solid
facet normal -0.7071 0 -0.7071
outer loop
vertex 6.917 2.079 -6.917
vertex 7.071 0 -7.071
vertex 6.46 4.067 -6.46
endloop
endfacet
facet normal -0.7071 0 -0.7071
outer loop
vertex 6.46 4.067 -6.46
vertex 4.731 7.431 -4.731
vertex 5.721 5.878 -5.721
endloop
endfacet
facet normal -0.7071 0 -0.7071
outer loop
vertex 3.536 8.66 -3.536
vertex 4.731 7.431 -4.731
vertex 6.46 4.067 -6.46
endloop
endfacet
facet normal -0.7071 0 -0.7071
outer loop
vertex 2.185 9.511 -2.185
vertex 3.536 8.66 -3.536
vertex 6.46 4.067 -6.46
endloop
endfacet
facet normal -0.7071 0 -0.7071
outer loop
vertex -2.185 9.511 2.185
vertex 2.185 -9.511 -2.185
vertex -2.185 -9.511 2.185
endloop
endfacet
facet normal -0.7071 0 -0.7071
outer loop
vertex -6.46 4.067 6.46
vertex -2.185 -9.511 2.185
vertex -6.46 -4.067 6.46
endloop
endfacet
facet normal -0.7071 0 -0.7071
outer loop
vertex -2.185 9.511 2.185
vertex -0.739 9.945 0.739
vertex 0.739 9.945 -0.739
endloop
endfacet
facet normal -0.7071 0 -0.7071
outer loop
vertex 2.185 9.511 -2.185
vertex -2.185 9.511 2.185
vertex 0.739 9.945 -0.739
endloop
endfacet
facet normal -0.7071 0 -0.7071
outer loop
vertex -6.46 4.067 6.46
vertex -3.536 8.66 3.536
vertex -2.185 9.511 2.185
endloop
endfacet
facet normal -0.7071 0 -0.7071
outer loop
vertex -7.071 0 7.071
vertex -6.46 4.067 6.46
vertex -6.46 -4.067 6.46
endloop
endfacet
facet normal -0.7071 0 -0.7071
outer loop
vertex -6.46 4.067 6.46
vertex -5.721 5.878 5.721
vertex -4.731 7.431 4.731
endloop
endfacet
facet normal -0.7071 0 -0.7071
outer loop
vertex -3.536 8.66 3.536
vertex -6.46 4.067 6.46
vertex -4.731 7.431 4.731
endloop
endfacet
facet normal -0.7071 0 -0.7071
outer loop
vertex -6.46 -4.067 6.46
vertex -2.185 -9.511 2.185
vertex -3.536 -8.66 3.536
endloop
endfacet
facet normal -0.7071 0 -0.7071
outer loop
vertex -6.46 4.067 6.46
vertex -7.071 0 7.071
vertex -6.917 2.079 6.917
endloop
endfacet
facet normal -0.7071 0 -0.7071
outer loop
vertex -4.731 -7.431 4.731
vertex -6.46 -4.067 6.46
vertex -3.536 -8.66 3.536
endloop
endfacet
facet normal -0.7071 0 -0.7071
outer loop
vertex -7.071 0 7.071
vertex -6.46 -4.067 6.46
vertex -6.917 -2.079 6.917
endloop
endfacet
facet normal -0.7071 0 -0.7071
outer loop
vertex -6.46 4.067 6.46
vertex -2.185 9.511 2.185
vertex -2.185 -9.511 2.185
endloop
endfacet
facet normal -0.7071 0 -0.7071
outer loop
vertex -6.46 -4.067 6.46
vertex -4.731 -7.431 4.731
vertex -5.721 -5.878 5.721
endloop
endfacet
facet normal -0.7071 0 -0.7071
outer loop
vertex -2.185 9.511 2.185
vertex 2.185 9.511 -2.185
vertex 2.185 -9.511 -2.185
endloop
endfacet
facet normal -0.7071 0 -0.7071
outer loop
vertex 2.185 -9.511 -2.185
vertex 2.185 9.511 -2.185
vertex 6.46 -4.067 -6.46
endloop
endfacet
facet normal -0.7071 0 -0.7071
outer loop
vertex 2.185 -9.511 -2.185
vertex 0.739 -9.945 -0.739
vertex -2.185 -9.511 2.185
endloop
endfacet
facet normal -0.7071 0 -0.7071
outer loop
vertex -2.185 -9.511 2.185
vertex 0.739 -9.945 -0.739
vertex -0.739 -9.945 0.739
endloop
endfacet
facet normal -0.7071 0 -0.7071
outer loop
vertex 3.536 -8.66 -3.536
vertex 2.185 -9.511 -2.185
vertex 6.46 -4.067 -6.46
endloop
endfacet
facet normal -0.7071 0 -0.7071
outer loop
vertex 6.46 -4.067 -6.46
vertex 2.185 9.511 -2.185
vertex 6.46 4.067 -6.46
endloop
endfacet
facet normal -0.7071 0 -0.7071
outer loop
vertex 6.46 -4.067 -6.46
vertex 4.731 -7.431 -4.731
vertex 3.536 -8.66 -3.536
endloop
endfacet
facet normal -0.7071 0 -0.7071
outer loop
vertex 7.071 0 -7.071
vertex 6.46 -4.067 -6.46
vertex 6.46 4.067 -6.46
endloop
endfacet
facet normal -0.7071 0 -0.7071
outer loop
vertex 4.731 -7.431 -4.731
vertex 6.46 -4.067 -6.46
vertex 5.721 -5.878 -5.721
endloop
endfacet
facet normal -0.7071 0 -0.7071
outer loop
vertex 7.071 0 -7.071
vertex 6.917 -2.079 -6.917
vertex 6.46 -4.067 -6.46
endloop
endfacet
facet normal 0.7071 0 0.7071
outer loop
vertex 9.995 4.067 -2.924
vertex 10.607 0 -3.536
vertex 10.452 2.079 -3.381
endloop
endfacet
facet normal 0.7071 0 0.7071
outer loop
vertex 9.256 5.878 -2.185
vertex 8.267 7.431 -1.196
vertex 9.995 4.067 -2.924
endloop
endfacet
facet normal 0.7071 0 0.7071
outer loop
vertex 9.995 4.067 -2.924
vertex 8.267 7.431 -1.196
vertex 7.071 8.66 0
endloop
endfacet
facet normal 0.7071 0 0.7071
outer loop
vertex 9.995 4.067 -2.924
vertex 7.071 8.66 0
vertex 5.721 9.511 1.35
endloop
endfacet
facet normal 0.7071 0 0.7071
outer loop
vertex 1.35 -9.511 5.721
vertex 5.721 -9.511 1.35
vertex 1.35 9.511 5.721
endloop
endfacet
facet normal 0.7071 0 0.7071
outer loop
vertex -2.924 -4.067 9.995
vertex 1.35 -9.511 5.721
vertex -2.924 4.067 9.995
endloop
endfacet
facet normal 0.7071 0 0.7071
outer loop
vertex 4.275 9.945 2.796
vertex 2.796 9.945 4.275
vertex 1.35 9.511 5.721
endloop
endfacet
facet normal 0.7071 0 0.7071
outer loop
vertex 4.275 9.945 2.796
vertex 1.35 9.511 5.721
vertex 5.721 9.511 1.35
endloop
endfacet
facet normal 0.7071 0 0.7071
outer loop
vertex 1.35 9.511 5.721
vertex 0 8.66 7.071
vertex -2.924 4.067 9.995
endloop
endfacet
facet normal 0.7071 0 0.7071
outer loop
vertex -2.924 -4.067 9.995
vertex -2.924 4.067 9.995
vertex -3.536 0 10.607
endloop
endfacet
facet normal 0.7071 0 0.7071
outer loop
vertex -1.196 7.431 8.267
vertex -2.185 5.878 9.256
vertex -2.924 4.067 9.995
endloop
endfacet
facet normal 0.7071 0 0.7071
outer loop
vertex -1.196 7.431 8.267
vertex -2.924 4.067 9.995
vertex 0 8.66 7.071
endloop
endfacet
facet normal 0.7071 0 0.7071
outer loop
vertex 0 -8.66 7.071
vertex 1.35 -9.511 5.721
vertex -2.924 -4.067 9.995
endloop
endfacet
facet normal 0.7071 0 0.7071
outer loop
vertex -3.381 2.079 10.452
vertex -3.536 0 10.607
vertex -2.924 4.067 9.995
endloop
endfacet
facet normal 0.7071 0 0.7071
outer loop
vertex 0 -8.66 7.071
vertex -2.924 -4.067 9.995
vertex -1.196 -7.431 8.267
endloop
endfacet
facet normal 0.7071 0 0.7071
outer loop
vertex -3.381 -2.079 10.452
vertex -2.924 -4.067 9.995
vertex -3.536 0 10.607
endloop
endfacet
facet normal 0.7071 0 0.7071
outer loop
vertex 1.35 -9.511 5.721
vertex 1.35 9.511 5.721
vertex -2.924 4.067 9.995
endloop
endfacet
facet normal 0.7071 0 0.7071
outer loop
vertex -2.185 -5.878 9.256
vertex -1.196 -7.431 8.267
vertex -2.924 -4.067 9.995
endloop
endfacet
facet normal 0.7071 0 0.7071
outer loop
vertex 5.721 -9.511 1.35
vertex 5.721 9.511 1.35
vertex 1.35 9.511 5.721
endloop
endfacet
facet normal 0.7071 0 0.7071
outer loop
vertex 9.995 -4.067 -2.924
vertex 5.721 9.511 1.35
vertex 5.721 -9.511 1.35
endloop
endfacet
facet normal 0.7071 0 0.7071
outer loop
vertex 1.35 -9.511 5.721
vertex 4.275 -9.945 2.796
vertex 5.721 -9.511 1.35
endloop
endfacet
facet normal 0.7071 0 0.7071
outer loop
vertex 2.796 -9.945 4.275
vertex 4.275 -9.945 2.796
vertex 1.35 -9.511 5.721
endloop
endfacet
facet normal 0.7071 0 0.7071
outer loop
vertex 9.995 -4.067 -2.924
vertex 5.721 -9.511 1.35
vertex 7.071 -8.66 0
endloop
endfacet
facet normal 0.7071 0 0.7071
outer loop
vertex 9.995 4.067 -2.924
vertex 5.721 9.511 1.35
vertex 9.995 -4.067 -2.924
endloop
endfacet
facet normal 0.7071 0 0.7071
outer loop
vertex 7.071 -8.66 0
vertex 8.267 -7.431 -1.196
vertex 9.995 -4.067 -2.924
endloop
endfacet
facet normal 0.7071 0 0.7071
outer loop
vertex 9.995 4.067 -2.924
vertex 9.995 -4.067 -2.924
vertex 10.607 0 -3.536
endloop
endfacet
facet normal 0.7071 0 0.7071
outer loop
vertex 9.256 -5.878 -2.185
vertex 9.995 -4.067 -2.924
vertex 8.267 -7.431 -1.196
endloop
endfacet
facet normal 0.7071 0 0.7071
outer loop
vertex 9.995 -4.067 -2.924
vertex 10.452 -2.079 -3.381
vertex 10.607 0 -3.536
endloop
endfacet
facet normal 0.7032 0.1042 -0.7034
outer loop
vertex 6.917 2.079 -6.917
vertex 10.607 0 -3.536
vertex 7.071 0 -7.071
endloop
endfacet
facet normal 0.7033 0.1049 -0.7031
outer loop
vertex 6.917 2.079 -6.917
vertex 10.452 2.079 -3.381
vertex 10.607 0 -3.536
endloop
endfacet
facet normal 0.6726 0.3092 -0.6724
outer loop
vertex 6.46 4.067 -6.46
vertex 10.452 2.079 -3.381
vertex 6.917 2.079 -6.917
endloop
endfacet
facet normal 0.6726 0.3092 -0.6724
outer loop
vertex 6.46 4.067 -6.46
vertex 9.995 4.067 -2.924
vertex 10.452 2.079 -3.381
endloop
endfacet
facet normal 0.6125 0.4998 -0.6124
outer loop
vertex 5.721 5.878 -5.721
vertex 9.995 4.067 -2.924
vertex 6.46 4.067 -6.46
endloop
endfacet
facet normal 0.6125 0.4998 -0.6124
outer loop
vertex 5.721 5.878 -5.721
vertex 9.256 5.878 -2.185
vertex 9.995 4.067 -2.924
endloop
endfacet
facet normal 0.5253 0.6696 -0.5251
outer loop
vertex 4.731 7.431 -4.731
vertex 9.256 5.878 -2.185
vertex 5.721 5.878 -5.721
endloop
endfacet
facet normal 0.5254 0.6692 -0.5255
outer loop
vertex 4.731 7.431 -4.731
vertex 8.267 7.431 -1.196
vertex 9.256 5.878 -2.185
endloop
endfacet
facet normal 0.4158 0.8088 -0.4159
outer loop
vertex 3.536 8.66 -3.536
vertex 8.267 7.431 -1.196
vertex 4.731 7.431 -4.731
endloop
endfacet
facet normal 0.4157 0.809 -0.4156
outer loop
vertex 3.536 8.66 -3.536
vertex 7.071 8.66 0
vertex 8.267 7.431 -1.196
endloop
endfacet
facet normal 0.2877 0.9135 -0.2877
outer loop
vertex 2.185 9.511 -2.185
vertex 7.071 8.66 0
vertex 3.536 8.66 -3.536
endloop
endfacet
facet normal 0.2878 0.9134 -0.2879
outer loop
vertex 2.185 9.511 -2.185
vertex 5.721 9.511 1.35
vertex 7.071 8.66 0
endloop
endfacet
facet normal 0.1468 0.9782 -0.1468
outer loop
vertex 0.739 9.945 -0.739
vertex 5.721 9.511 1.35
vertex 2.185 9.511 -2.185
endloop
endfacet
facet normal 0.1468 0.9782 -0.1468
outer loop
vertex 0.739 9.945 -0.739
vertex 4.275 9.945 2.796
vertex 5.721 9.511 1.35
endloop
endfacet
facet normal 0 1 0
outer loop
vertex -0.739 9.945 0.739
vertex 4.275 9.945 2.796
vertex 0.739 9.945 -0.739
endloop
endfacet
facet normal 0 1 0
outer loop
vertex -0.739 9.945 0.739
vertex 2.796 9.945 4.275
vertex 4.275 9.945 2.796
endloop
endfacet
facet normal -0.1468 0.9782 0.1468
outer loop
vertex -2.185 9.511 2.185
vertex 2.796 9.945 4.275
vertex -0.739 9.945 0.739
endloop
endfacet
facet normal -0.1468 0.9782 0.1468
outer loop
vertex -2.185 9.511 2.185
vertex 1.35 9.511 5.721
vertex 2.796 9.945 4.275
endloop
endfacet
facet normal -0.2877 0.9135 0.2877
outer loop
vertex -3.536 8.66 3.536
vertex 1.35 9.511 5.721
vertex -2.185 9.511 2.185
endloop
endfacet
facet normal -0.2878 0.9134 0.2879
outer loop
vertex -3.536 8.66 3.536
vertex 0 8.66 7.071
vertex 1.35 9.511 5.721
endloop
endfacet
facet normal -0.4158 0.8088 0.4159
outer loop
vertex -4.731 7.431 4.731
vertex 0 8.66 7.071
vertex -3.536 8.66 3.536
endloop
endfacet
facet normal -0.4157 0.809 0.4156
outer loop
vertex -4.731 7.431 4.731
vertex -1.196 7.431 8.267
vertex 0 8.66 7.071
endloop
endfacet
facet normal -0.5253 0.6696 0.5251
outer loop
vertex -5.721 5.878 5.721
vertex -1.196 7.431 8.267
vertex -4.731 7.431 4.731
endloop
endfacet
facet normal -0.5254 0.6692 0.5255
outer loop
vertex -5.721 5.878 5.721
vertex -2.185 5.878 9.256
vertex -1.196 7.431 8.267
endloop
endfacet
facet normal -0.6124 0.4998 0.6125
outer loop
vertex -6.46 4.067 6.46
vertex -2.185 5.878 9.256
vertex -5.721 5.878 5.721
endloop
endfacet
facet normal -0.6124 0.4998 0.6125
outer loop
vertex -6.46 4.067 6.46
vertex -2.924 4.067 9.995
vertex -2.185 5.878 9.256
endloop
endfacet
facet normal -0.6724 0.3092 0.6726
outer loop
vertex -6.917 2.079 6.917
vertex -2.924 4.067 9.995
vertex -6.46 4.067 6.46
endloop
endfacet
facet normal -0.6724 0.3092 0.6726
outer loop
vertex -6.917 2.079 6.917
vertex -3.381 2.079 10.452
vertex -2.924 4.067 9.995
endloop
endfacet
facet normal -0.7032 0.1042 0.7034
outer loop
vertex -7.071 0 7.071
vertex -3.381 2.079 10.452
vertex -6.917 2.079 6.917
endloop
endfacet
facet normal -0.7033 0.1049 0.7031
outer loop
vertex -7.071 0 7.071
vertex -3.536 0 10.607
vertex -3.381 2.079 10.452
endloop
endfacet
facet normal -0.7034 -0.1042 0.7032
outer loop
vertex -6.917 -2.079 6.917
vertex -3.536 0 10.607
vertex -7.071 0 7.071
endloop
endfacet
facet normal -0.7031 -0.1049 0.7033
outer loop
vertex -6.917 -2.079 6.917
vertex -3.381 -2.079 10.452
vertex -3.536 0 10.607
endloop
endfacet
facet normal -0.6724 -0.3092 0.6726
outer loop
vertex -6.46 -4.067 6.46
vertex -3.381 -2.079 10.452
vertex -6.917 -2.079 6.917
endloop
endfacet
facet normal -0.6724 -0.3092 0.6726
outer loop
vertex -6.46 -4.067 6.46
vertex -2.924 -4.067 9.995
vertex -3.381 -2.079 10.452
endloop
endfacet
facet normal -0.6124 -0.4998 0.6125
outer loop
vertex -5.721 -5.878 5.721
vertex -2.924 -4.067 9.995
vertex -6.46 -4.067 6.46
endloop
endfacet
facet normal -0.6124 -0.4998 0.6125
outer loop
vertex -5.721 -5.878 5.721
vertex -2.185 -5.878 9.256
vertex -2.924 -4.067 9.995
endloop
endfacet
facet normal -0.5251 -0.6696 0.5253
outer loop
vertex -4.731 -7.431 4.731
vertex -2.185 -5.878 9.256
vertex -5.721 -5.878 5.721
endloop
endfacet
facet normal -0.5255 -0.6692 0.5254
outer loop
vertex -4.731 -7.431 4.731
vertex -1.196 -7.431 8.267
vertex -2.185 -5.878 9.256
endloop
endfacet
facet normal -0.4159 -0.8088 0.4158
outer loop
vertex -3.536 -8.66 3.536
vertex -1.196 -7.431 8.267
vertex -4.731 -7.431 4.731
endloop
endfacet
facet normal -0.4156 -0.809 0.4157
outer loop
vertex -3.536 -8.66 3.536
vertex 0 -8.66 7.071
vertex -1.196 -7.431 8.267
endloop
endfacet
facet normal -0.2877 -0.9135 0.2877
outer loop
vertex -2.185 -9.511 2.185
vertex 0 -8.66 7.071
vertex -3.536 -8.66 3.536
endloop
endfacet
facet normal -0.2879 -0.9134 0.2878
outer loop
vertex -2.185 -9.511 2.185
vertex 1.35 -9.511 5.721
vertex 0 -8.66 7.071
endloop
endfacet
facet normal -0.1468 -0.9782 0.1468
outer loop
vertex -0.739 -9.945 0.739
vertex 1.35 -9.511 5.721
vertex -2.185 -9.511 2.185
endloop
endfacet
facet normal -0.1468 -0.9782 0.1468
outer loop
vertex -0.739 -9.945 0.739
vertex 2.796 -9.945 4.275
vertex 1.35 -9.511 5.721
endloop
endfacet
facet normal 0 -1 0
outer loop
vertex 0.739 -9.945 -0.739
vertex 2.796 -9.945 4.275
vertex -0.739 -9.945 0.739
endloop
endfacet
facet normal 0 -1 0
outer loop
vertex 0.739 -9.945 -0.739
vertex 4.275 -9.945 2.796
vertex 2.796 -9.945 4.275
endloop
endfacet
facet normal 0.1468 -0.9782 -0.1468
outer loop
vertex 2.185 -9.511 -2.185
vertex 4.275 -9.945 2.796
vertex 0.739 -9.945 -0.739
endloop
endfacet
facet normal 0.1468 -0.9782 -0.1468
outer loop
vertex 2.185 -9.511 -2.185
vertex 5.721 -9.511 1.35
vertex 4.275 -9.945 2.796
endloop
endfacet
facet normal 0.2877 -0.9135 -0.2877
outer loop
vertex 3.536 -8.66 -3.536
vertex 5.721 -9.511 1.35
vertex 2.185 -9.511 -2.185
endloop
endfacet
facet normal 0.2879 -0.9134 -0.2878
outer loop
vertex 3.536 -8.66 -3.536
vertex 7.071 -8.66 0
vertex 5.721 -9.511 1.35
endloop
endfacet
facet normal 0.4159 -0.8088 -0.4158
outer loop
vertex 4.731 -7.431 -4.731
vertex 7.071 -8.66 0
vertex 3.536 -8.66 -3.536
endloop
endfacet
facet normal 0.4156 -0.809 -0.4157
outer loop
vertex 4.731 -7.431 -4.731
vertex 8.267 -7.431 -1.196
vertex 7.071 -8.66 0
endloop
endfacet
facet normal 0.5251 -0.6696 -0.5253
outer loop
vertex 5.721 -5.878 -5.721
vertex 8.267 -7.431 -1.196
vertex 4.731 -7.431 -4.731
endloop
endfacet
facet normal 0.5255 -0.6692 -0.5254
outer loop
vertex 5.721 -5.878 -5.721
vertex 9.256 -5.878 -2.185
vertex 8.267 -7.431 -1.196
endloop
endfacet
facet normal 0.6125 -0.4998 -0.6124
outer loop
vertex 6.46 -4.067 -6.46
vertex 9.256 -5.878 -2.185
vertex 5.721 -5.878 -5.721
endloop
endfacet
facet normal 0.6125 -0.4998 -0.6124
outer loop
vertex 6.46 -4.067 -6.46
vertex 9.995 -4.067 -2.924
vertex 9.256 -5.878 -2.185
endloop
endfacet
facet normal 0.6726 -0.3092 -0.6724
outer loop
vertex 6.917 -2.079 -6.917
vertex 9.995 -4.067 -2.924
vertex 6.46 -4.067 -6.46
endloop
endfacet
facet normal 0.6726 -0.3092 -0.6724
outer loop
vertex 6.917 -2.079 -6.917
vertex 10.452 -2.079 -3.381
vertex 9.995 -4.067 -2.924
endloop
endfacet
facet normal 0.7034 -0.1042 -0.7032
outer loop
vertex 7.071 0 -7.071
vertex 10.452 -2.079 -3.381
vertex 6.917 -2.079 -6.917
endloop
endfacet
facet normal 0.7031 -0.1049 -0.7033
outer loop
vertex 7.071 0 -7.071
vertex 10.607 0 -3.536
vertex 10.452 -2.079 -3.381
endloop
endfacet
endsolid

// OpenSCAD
 constructionPlane([1,0,1])linear_extrude(5) circle(10);


module constructionPlane(normal=[0,0,1],origin=[0,0,0]){
    look_at(normal ,origin ){  children();
    if($preview){%linear_extrude(10e-16)square($vpd*.5,true);}        
    
        }
        }

module look_at(lookpoint,origin=[0,0,0],rotatefrom=[0,0,1]){
rotations=look_at(lookpoint,origin ,rotatefrom);
rotate(rotations[0],rotations[1]) children();
}
function look_at(p,o=[0,0,0],up=[0,0,1])=let(a=up,b=p-o,c=cross(a,b) ,d=angle(a,b))[d,c];

function angle (a,b)=atan2(sqrt((cross(a, b)*cross(a, b))), (a* b));
